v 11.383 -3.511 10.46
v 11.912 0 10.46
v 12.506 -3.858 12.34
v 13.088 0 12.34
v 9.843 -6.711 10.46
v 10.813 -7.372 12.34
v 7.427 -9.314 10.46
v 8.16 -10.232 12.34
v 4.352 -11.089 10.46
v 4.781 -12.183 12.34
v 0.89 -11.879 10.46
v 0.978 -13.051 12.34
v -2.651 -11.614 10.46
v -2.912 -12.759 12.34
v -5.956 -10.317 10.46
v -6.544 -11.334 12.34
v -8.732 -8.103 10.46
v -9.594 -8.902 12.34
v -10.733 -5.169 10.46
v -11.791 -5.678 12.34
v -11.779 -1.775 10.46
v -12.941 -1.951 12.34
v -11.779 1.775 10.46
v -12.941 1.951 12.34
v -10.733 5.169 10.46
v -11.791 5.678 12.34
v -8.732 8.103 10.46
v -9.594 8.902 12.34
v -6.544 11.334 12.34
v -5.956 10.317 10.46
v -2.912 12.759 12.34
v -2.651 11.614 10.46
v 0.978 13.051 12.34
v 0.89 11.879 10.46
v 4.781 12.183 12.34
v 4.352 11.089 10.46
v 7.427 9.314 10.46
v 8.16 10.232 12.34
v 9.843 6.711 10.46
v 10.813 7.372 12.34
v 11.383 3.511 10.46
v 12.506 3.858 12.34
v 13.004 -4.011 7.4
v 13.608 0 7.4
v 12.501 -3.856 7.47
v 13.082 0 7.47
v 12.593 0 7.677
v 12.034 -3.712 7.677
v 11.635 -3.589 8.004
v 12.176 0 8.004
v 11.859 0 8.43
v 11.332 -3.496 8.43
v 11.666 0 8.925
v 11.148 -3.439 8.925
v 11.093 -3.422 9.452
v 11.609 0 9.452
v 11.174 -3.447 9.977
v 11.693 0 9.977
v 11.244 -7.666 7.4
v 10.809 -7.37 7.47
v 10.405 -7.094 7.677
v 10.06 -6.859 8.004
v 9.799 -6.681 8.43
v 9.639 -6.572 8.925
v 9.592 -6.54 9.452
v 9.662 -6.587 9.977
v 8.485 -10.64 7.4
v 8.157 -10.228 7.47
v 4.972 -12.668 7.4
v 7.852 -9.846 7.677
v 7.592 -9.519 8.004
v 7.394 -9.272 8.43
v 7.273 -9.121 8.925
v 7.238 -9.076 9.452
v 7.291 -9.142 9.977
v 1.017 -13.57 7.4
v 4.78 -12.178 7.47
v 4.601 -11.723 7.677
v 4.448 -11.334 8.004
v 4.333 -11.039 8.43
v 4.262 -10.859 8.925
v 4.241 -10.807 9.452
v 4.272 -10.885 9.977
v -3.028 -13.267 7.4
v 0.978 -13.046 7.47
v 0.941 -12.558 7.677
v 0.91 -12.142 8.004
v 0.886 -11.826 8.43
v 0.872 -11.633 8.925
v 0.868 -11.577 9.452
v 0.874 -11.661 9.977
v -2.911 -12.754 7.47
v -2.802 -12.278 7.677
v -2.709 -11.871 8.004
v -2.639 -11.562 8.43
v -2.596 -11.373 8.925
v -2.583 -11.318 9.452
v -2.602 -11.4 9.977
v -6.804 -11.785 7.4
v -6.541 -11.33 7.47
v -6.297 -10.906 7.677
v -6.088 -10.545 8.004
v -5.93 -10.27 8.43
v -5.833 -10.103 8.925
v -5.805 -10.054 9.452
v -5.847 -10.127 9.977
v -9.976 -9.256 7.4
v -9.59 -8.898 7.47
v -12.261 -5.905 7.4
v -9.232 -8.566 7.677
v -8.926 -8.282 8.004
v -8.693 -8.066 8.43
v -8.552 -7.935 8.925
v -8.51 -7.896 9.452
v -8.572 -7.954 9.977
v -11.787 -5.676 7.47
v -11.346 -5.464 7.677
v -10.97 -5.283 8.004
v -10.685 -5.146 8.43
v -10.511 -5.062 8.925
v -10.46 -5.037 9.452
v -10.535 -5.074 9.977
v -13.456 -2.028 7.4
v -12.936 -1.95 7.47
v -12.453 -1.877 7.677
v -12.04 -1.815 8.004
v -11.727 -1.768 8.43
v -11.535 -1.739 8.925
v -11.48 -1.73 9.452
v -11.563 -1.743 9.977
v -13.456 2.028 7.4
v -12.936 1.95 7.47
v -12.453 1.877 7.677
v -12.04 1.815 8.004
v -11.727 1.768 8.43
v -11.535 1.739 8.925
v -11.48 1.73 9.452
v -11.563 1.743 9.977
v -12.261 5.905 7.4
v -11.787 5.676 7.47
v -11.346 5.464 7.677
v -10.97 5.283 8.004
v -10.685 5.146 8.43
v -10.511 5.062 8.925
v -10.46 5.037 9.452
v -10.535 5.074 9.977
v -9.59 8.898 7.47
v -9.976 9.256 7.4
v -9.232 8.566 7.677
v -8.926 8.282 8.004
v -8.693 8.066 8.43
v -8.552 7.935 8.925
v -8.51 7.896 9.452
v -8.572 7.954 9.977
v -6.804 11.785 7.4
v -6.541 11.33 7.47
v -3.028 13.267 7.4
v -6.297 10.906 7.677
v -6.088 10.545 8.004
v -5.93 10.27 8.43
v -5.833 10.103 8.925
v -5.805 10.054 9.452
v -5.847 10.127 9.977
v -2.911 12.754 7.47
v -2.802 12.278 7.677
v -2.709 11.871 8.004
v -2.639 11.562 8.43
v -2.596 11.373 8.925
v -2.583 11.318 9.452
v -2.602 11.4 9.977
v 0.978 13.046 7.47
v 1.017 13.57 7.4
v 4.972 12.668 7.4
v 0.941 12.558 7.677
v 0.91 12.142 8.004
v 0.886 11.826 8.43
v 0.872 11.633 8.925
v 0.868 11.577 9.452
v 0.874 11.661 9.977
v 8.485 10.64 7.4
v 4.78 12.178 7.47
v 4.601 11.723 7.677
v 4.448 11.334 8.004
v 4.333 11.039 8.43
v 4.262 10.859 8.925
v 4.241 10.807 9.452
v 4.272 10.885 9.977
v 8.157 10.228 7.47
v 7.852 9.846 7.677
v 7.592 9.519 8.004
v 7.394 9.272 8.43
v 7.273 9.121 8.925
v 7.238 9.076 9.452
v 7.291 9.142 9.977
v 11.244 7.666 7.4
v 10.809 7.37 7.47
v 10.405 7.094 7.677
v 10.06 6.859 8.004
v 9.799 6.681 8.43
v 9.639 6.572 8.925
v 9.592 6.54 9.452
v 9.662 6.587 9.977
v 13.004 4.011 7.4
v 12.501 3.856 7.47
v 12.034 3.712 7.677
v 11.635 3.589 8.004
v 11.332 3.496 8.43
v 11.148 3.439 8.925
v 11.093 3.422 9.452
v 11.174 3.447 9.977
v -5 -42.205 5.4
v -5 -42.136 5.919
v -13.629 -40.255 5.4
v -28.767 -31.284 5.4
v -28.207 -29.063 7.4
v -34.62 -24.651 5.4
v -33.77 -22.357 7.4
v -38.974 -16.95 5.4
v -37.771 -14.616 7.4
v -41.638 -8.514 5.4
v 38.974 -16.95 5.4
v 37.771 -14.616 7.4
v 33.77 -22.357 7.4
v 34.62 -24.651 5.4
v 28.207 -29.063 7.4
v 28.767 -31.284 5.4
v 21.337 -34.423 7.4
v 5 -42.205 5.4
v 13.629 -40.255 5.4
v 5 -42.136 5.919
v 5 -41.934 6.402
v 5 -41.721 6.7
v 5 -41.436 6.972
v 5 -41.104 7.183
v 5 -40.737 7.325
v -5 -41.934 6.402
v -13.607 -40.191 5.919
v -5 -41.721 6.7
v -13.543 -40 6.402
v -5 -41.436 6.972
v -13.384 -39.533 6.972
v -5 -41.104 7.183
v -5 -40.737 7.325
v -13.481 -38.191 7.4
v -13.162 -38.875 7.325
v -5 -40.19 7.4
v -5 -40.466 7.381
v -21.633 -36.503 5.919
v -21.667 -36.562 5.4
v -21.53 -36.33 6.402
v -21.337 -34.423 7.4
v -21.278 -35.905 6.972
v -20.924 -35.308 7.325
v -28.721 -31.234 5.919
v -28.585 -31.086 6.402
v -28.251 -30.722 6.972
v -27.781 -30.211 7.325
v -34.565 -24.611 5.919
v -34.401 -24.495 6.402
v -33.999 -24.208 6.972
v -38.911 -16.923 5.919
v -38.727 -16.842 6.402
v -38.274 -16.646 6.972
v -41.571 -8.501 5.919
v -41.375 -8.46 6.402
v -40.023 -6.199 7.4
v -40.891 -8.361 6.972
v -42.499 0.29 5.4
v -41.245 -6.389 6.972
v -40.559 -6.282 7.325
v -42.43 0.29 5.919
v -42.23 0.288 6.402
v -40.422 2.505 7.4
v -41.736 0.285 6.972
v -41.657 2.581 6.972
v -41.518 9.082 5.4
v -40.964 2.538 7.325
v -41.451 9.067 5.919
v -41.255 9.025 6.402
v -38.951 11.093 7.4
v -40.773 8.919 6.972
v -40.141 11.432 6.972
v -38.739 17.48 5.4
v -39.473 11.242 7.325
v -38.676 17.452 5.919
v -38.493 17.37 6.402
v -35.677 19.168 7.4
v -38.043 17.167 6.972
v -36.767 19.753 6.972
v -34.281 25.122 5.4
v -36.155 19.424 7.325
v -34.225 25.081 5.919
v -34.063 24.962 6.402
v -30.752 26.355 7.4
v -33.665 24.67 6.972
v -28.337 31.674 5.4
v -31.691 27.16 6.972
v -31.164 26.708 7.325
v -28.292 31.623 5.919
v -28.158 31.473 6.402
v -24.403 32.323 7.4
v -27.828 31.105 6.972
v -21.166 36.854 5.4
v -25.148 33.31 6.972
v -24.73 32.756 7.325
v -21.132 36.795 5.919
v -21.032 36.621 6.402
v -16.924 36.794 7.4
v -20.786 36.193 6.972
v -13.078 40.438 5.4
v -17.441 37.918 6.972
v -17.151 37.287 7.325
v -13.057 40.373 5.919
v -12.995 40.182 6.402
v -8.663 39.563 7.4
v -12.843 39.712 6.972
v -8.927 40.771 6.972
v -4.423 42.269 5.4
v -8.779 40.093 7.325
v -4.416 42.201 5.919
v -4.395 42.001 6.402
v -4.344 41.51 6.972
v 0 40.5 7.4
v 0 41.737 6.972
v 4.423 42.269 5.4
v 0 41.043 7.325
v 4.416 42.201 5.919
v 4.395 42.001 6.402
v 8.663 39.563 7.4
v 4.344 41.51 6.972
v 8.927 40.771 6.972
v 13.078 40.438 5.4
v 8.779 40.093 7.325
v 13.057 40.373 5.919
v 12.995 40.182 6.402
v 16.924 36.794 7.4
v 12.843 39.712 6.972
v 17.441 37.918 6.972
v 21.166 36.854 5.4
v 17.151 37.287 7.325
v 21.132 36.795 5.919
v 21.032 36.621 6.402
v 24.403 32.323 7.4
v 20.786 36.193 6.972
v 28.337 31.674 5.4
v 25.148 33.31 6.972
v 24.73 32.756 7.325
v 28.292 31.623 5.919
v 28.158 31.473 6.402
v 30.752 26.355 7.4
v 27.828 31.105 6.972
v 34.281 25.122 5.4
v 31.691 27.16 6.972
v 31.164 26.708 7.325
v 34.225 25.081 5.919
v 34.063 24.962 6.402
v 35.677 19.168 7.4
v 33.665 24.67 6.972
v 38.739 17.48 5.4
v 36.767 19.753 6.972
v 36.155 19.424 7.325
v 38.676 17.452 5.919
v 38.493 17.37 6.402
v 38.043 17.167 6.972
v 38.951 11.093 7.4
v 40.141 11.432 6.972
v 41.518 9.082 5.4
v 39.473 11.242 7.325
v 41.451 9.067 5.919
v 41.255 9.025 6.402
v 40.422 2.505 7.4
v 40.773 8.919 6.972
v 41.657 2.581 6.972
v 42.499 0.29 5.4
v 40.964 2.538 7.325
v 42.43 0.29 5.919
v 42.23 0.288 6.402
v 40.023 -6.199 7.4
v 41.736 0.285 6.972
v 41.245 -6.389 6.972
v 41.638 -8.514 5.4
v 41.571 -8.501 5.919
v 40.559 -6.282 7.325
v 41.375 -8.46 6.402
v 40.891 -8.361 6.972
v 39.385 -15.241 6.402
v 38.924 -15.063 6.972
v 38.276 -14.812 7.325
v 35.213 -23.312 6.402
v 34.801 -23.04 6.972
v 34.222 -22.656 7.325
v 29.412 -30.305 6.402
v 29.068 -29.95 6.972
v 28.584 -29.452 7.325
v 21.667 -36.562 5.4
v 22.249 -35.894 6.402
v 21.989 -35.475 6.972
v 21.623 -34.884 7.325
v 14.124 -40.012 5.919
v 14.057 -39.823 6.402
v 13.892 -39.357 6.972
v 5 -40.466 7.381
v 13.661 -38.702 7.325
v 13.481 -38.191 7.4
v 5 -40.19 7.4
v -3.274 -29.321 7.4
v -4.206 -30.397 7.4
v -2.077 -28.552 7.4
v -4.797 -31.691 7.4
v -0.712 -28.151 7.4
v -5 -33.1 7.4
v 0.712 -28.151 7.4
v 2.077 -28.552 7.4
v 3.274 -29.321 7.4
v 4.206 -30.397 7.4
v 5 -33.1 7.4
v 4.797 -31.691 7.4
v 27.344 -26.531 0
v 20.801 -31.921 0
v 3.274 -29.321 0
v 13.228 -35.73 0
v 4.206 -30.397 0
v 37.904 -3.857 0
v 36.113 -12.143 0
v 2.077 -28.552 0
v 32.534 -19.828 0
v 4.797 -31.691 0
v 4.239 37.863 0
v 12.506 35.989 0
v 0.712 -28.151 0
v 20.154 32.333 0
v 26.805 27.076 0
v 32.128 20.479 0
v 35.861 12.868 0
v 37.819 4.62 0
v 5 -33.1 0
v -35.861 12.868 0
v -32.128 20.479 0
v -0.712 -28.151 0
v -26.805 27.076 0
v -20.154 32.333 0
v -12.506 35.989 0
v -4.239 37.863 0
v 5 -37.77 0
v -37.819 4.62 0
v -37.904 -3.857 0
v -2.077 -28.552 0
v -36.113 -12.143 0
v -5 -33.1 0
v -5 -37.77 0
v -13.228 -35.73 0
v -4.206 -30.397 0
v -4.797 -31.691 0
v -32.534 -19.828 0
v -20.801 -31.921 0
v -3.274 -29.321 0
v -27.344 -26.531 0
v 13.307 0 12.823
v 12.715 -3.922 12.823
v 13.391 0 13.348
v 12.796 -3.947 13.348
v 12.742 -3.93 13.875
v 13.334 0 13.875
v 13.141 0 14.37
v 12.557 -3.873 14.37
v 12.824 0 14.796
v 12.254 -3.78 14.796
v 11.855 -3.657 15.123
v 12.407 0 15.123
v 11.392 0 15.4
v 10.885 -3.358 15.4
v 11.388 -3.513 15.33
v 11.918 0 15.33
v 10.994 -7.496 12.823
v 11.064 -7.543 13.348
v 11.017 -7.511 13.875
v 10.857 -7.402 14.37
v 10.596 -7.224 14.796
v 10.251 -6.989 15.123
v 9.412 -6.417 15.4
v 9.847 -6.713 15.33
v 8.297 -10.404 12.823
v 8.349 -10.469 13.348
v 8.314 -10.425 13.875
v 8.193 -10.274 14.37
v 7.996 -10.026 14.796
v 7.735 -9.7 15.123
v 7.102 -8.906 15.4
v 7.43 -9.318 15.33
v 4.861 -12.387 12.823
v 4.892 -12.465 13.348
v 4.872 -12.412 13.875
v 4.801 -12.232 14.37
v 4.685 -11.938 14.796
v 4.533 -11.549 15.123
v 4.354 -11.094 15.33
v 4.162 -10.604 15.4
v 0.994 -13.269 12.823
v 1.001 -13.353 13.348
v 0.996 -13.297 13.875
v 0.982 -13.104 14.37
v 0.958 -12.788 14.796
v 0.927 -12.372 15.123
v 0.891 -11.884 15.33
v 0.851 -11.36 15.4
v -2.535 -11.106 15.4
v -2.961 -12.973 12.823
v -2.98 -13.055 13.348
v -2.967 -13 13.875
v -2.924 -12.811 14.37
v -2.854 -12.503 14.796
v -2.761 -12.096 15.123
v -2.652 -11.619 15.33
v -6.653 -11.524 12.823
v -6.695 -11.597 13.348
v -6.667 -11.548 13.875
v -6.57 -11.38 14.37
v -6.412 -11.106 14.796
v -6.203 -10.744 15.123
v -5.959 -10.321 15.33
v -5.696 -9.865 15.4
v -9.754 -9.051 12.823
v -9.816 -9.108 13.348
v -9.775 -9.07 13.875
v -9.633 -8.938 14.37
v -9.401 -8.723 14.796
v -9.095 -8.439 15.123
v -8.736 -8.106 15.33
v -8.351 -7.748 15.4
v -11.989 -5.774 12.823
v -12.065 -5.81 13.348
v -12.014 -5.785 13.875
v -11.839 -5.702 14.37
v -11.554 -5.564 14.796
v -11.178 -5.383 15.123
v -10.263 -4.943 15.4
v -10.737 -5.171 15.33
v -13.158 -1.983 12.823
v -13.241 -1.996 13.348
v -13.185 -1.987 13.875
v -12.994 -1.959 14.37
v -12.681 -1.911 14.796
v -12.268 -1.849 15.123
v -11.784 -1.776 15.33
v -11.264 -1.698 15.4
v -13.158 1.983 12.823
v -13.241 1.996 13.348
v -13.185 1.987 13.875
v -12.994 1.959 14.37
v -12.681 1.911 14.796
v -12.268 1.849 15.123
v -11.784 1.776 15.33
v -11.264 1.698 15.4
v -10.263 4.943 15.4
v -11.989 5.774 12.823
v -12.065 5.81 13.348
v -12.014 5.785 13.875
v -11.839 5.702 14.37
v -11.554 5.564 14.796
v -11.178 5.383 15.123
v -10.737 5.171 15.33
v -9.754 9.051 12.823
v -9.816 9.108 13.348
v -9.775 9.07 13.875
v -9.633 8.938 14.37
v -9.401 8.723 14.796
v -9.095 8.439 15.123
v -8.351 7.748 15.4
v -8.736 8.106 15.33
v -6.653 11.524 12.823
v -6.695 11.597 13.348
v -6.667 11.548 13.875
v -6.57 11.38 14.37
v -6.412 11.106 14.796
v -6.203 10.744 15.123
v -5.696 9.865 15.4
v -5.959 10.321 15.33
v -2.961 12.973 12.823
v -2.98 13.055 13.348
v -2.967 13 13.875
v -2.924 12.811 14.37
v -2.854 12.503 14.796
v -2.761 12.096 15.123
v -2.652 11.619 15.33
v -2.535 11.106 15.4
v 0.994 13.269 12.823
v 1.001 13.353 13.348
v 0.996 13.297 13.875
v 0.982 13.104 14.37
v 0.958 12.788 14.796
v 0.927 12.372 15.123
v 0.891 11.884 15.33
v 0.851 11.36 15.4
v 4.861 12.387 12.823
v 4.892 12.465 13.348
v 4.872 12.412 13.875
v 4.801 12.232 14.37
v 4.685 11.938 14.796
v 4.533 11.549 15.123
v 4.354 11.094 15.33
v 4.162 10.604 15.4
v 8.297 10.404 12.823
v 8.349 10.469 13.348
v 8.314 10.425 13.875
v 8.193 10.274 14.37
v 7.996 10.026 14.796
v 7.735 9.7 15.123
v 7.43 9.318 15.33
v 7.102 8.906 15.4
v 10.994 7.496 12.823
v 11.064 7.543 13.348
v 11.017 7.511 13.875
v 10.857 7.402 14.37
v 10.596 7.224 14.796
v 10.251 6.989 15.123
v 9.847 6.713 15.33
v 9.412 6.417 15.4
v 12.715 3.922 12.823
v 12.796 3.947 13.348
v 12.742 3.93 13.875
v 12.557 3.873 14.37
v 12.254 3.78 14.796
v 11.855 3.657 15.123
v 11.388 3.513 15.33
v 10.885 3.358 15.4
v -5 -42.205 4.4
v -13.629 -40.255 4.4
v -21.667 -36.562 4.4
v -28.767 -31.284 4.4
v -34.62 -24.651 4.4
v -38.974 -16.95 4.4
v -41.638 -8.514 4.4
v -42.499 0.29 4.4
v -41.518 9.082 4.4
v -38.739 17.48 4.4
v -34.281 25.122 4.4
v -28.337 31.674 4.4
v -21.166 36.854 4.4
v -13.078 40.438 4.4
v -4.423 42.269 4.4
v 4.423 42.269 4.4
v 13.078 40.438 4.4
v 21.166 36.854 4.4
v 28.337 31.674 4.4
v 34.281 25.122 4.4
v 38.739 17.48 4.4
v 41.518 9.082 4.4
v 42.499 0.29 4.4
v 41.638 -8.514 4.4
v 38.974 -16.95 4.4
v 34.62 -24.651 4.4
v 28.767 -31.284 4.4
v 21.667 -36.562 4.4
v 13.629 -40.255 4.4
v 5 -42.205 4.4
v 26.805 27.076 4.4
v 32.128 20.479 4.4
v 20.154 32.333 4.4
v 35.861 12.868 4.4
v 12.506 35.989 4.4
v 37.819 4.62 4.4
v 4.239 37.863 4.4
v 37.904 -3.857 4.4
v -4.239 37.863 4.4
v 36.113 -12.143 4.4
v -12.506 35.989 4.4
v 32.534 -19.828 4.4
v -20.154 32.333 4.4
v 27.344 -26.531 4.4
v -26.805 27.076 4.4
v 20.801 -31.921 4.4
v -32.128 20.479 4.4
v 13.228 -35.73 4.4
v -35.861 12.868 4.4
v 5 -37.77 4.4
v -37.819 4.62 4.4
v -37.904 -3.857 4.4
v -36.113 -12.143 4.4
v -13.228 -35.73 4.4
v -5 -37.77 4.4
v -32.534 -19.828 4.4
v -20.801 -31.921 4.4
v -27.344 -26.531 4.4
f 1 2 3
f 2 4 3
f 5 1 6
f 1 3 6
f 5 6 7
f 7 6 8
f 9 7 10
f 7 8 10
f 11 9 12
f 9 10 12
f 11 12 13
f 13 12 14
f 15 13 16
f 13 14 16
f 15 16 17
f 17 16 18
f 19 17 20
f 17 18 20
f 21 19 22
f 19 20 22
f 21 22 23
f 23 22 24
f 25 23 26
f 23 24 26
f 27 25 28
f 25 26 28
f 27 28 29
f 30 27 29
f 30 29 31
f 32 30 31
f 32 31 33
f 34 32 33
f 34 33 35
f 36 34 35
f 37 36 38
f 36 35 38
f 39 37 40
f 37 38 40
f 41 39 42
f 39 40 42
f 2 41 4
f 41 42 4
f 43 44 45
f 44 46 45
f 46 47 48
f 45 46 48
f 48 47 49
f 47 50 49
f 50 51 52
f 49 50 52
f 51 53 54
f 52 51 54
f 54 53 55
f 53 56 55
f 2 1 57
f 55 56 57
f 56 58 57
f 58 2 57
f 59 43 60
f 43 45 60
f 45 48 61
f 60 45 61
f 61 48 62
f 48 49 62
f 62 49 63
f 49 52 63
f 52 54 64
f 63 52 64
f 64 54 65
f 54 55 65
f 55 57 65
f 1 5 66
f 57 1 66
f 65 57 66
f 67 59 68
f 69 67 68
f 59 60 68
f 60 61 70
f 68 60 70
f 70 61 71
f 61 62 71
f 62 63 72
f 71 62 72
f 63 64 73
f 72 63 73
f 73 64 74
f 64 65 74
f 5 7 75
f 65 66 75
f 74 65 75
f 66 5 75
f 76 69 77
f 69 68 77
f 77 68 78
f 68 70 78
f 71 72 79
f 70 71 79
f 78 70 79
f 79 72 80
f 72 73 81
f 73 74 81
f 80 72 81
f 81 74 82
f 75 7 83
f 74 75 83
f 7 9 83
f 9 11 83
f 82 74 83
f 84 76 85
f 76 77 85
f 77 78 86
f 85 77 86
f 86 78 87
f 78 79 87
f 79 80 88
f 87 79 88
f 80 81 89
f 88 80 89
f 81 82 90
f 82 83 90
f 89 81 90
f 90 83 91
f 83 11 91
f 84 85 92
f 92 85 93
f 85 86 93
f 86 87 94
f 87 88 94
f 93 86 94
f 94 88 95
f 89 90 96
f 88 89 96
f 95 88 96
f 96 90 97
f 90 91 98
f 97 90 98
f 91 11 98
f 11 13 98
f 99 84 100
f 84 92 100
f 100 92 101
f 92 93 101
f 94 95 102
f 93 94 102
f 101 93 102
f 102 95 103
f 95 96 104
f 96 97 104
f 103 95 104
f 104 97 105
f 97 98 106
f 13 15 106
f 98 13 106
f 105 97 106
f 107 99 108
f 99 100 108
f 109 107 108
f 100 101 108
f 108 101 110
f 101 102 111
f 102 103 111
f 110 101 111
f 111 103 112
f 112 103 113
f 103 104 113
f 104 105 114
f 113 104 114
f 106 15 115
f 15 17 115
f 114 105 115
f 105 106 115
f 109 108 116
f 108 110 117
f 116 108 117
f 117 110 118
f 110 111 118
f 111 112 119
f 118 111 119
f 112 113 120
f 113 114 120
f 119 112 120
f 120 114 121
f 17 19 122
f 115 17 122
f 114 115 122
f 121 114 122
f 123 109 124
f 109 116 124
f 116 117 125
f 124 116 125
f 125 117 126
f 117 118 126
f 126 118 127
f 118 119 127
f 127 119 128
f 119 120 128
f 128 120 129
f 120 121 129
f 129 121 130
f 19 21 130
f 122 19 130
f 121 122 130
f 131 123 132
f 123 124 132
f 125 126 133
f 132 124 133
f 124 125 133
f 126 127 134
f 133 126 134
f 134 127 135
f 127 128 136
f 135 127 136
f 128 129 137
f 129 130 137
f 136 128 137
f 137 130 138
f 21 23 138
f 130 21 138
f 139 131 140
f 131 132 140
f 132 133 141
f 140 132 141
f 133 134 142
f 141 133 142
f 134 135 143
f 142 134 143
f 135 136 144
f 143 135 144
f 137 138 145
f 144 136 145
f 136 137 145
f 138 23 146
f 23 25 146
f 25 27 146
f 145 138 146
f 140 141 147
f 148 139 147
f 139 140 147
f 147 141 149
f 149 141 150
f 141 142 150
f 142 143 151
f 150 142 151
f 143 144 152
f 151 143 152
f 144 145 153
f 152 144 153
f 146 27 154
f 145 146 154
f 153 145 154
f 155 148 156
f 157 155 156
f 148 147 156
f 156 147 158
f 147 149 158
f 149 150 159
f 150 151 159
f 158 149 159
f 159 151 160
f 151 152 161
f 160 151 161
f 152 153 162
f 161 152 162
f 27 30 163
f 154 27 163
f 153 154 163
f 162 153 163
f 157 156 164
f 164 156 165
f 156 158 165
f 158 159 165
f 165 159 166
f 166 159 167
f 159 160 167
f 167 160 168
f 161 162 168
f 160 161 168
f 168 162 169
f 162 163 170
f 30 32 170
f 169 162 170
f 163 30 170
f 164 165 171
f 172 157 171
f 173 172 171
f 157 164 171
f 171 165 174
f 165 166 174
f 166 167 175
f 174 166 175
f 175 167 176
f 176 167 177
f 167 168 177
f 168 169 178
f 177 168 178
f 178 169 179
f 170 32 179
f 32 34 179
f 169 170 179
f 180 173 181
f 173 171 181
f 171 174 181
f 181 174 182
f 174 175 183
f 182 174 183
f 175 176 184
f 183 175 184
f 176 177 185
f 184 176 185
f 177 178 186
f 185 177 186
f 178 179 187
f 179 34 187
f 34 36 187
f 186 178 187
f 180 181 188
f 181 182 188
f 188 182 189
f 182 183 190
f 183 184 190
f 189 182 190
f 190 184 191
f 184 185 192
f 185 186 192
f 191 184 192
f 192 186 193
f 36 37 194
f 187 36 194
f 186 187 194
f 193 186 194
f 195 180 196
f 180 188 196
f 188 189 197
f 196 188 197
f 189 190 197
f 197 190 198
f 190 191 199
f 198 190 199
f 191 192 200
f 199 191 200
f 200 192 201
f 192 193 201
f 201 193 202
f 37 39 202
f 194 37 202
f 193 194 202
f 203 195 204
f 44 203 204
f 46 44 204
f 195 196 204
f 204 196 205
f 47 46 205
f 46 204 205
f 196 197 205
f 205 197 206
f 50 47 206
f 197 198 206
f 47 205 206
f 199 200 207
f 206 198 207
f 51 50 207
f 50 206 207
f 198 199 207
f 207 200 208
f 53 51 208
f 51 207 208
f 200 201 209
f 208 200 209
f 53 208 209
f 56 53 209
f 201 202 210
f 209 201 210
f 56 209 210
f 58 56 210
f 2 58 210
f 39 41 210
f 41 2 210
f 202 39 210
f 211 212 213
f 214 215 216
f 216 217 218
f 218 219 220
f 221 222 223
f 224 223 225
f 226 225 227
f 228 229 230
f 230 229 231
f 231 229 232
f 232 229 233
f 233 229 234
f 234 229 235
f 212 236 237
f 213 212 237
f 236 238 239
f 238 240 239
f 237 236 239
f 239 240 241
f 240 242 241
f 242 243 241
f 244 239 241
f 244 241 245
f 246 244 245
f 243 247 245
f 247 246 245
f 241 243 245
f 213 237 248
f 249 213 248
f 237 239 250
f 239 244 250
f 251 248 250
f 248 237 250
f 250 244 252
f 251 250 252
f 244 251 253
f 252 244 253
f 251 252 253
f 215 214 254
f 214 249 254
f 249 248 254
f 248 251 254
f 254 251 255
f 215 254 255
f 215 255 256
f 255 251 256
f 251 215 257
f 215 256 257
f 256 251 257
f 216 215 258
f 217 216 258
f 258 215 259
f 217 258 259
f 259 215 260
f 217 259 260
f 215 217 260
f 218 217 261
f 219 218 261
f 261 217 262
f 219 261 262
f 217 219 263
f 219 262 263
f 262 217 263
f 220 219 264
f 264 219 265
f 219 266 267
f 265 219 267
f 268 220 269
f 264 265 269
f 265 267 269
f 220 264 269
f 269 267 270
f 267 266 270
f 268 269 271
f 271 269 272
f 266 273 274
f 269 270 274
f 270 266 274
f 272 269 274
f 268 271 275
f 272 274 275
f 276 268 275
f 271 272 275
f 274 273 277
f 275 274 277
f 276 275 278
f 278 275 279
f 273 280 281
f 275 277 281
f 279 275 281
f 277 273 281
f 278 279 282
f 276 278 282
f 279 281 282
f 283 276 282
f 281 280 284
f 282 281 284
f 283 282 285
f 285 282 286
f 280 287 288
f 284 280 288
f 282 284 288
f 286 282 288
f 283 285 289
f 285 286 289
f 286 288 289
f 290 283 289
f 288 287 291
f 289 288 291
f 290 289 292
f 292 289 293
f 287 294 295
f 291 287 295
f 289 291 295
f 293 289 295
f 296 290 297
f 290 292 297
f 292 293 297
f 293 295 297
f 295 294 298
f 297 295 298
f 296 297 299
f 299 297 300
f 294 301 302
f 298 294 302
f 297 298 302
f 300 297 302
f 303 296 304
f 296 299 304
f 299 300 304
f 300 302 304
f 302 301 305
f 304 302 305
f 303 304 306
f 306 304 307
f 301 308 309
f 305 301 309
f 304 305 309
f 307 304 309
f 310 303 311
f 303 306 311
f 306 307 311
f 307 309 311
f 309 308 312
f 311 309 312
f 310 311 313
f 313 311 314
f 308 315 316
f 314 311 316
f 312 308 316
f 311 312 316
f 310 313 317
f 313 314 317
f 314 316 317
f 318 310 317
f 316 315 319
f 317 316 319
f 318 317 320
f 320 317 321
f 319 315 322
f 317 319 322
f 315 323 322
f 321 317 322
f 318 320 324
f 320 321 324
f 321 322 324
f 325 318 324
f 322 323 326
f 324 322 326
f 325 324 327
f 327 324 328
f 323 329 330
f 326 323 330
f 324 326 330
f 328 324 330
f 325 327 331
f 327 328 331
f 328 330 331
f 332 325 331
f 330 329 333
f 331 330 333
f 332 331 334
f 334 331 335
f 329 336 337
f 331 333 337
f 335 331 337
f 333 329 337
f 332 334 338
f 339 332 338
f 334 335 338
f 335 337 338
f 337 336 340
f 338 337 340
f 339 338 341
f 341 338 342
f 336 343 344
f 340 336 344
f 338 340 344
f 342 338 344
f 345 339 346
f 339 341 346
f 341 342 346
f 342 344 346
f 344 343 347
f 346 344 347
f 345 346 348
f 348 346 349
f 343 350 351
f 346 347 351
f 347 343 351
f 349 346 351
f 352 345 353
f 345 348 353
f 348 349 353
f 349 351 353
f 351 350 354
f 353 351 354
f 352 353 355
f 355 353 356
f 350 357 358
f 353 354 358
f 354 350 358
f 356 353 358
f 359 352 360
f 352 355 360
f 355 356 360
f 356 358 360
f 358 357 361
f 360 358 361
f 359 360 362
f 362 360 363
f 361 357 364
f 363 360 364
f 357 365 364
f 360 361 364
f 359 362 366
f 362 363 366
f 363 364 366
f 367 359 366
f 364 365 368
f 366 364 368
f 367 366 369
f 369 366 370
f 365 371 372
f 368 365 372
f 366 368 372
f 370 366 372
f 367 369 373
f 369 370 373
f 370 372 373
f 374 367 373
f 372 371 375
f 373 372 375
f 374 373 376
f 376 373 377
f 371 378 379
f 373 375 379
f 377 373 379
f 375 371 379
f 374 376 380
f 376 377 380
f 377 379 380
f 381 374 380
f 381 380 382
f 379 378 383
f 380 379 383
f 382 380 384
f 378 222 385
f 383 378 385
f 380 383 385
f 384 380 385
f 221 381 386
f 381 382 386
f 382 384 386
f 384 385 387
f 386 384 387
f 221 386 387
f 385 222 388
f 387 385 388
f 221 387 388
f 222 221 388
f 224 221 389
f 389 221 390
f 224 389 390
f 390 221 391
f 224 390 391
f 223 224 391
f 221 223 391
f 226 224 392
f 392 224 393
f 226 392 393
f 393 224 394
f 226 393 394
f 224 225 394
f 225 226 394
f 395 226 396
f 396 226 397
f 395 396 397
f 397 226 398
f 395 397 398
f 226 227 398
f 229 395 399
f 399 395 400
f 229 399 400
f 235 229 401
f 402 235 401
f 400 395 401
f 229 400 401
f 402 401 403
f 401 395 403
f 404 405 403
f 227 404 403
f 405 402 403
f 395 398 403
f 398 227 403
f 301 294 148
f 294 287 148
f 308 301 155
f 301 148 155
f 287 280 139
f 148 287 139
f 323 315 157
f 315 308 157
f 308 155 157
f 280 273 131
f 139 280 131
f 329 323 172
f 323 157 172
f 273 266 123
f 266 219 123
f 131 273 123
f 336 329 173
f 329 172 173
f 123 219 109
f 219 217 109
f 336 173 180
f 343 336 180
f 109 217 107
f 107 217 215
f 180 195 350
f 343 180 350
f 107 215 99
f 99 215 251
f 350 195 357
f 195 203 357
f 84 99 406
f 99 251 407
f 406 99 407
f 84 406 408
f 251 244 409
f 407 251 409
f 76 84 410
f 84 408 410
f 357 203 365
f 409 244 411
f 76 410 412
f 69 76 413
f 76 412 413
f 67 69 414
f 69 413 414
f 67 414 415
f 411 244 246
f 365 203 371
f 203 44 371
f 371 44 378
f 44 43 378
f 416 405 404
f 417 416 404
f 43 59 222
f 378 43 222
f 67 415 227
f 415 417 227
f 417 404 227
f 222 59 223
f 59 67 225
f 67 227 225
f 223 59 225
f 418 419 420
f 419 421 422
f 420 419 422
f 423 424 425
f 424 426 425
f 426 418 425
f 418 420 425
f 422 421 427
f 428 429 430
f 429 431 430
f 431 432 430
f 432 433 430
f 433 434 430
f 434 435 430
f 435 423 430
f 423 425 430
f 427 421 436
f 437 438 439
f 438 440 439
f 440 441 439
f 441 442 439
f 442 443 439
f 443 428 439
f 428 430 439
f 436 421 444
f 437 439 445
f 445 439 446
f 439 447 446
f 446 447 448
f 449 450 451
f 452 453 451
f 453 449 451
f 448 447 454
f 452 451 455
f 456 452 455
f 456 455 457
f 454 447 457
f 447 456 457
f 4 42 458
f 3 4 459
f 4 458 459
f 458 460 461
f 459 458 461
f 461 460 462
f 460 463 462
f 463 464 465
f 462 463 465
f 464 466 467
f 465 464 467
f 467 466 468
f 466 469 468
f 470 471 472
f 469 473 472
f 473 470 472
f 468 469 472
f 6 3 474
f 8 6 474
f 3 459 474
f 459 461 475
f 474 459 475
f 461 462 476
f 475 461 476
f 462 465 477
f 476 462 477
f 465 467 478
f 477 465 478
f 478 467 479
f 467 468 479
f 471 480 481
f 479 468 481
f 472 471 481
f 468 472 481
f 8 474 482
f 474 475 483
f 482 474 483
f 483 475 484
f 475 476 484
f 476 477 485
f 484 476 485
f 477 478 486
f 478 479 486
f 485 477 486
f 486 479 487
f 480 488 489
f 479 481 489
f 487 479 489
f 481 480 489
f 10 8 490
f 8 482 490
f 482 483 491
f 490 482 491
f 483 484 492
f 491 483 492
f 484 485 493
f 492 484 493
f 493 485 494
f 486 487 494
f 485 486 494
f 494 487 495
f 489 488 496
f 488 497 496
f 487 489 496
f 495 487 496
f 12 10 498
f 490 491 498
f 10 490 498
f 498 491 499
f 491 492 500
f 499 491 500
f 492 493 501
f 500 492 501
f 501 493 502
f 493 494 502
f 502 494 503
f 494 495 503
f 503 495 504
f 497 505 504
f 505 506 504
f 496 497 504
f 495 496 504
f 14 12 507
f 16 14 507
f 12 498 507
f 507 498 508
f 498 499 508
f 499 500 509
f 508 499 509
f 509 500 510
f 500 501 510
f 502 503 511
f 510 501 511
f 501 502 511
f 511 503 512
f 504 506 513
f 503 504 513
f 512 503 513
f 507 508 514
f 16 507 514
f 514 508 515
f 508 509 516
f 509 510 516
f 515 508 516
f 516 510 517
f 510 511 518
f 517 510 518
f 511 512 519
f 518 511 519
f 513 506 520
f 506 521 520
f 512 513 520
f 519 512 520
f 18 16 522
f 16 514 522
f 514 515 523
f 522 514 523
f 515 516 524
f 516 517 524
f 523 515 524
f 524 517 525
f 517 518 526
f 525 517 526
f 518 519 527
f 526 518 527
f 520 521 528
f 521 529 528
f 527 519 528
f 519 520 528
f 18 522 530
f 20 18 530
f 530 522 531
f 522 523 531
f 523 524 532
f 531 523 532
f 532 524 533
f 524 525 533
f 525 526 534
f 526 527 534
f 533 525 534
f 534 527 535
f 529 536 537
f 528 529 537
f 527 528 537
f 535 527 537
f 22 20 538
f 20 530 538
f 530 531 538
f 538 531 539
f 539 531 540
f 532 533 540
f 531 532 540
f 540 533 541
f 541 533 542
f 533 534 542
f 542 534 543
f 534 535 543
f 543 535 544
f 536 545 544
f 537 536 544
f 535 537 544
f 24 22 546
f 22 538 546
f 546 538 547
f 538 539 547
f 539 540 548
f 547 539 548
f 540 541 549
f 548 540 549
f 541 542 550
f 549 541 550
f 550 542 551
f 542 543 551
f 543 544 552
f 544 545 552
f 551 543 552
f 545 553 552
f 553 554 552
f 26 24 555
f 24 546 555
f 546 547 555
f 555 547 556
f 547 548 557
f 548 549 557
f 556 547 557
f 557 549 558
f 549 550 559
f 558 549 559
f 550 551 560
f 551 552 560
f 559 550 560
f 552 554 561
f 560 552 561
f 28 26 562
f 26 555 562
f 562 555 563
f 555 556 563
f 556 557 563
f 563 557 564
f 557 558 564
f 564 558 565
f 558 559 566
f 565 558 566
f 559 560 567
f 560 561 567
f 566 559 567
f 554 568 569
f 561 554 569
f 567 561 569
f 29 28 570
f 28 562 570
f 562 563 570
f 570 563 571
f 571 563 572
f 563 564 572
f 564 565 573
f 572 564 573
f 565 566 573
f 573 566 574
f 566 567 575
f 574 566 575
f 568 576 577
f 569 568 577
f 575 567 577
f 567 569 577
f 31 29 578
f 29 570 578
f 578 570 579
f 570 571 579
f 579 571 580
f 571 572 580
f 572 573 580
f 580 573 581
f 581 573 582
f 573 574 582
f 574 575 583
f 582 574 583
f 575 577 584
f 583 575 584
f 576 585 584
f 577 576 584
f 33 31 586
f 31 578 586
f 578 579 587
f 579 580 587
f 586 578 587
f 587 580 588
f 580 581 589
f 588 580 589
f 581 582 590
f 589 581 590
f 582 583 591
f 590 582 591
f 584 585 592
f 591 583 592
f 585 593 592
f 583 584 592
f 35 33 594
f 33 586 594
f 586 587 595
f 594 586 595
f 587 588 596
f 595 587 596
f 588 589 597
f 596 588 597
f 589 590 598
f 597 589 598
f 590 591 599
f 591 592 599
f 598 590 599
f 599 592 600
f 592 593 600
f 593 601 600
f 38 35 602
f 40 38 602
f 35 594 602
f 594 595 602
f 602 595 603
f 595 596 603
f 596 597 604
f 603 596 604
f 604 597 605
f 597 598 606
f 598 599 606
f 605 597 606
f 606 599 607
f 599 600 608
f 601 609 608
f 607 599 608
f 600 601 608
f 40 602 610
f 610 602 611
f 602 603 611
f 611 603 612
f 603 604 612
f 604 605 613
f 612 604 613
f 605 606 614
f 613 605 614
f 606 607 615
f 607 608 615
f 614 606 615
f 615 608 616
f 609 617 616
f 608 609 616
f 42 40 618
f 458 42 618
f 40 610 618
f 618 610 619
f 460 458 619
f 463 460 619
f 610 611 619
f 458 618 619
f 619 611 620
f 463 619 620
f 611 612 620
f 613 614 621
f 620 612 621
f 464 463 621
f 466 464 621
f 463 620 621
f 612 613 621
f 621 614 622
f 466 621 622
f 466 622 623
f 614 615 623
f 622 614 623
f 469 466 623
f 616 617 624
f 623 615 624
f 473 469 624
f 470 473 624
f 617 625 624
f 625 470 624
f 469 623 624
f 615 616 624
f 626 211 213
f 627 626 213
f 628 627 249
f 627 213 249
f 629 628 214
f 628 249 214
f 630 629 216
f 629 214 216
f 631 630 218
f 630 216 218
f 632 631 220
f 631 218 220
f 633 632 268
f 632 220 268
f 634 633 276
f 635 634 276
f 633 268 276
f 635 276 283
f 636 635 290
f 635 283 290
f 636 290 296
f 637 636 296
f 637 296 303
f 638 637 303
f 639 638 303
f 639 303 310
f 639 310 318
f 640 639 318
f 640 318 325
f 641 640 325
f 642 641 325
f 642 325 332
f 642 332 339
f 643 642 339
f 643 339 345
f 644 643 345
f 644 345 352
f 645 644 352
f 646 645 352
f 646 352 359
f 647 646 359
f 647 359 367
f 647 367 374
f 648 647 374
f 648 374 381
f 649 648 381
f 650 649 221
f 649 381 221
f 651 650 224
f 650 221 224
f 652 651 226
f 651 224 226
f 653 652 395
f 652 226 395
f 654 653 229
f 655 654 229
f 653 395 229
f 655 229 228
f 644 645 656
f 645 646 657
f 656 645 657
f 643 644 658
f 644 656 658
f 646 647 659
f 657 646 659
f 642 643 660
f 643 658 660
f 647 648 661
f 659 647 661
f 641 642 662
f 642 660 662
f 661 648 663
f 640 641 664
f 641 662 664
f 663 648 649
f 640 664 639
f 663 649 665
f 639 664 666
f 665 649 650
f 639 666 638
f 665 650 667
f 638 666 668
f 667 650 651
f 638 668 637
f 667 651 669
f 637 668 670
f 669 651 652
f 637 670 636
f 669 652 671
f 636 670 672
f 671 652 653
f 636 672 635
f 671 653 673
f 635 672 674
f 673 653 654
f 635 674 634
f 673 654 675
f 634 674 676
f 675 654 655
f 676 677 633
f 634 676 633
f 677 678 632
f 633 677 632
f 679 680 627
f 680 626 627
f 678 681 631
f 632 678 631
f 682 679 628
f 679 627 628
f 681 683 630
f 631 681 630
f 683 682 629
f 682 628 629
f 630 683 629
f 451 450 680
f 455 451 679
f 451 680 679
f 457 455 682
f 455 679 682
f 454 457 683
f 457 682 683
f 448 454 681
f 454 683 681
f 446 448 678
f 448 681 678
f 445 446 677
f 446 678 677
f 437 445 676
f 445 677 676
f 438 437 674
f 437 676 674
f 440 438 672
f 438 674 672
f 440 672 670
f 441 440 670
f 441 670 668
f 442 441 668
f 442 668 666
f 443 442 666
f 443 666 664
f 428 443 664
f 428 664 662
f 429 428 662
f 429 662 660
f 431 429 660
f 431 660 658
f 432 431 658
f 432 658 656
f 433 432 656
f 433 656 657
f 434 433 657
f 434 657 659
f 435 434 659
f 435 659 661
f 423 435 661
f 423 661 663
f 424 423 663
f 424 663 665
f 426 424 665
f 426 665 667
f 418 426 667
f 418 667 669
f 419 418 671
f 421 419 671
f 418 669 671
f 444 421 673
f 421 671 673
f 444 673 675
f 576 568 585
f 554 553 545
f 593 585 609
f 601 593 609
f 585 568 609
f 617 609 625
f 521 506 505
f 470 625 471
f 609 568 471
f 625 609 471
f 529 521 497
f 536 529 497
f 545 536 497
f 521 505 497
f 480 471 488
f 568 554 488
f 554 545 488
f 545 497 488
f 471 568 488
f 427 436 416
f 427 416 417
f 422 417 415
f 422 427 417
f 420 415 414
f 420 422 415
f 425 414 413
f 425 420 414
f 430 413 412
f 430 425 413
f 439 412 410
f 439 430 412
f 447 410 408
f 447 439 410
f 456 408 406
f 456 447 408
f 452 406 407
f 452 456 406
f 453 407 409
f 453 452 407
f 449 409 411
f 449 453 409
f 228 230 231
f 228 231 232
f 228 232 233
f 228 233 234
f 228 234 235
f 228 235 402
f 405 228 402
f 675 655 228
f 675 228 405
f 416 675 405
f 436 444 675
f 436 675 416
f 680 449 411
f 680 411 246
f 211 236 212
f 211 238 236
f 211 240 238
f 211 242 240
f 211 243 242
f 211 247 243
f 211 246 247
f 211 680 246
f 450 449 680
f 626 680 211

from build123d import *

# Parameters (mm, degrees)
F3_DEPTH      = 126
F3_DEPTH_BACK = 15.401


# Not quite as in the source:
# - an extrude ends at something that could not be found from the text; its depth is read off the source's solid


with BuildPart() as f1:
    # F0 (on Front) → F1 (revolve)
    with BuildSketch(Plane.XZ):
        with BuildLine():
            Line((0, 0), (38.1, 0))
            Line((38.1, 0), (38.1, 4.4))
            Line((38.1, 4.4), (42.5, 4.4))
            Line((42.5, 4.4), (42.5, 5.4))
            ThreePointArc((42.5, 5.4), (41.9142135624, 6.8142135624), (40.5, 7.4))
            Line((40.5, 7.4), (13.608495283, 7.4))
            ThreePointArc((13.608495283, 7.4), (11.8592103205, 8.4304629352), (11.912498675, 10.45999788))
            Line((11.912498675, 10.45999788), (13.087501325, 12.34000212))
            ThreePointArc((13.087501325, 12.34000212), (13.1407896795, 14.3695370648), (11.391504717, 15.4))
            Line((11.391504717, 15.4), (0, 15.4))
            Line((0, 15.4), (0, 0))
        make_face()
    revolve(axis=Axis((0, 0, 11.4377464585), (0, 0, -1)))

    # F2 (on Top) → F3 (cut, two sides)
    with BuildSketch(Plane.XY) as f3_sk:
        with BuildLine():
            ThreePointArc((5, -33.1), (0, -28.1), (-5, -33.1))
            Line((-5, -33.1), (-5, -42.5))
            Line((-5, -42.5), (5, -42.5))
            Line((5, -42.5), (5, -33.1))
        make_face()
    extrude(amount=-F3_DEPTH, mode=Mode.SUBTRACT)
    extrude(f3_sk.sketch, amount=F3_DEPTH_BACK, mode=Mode.SUBTRACT)


solid = f1.part
